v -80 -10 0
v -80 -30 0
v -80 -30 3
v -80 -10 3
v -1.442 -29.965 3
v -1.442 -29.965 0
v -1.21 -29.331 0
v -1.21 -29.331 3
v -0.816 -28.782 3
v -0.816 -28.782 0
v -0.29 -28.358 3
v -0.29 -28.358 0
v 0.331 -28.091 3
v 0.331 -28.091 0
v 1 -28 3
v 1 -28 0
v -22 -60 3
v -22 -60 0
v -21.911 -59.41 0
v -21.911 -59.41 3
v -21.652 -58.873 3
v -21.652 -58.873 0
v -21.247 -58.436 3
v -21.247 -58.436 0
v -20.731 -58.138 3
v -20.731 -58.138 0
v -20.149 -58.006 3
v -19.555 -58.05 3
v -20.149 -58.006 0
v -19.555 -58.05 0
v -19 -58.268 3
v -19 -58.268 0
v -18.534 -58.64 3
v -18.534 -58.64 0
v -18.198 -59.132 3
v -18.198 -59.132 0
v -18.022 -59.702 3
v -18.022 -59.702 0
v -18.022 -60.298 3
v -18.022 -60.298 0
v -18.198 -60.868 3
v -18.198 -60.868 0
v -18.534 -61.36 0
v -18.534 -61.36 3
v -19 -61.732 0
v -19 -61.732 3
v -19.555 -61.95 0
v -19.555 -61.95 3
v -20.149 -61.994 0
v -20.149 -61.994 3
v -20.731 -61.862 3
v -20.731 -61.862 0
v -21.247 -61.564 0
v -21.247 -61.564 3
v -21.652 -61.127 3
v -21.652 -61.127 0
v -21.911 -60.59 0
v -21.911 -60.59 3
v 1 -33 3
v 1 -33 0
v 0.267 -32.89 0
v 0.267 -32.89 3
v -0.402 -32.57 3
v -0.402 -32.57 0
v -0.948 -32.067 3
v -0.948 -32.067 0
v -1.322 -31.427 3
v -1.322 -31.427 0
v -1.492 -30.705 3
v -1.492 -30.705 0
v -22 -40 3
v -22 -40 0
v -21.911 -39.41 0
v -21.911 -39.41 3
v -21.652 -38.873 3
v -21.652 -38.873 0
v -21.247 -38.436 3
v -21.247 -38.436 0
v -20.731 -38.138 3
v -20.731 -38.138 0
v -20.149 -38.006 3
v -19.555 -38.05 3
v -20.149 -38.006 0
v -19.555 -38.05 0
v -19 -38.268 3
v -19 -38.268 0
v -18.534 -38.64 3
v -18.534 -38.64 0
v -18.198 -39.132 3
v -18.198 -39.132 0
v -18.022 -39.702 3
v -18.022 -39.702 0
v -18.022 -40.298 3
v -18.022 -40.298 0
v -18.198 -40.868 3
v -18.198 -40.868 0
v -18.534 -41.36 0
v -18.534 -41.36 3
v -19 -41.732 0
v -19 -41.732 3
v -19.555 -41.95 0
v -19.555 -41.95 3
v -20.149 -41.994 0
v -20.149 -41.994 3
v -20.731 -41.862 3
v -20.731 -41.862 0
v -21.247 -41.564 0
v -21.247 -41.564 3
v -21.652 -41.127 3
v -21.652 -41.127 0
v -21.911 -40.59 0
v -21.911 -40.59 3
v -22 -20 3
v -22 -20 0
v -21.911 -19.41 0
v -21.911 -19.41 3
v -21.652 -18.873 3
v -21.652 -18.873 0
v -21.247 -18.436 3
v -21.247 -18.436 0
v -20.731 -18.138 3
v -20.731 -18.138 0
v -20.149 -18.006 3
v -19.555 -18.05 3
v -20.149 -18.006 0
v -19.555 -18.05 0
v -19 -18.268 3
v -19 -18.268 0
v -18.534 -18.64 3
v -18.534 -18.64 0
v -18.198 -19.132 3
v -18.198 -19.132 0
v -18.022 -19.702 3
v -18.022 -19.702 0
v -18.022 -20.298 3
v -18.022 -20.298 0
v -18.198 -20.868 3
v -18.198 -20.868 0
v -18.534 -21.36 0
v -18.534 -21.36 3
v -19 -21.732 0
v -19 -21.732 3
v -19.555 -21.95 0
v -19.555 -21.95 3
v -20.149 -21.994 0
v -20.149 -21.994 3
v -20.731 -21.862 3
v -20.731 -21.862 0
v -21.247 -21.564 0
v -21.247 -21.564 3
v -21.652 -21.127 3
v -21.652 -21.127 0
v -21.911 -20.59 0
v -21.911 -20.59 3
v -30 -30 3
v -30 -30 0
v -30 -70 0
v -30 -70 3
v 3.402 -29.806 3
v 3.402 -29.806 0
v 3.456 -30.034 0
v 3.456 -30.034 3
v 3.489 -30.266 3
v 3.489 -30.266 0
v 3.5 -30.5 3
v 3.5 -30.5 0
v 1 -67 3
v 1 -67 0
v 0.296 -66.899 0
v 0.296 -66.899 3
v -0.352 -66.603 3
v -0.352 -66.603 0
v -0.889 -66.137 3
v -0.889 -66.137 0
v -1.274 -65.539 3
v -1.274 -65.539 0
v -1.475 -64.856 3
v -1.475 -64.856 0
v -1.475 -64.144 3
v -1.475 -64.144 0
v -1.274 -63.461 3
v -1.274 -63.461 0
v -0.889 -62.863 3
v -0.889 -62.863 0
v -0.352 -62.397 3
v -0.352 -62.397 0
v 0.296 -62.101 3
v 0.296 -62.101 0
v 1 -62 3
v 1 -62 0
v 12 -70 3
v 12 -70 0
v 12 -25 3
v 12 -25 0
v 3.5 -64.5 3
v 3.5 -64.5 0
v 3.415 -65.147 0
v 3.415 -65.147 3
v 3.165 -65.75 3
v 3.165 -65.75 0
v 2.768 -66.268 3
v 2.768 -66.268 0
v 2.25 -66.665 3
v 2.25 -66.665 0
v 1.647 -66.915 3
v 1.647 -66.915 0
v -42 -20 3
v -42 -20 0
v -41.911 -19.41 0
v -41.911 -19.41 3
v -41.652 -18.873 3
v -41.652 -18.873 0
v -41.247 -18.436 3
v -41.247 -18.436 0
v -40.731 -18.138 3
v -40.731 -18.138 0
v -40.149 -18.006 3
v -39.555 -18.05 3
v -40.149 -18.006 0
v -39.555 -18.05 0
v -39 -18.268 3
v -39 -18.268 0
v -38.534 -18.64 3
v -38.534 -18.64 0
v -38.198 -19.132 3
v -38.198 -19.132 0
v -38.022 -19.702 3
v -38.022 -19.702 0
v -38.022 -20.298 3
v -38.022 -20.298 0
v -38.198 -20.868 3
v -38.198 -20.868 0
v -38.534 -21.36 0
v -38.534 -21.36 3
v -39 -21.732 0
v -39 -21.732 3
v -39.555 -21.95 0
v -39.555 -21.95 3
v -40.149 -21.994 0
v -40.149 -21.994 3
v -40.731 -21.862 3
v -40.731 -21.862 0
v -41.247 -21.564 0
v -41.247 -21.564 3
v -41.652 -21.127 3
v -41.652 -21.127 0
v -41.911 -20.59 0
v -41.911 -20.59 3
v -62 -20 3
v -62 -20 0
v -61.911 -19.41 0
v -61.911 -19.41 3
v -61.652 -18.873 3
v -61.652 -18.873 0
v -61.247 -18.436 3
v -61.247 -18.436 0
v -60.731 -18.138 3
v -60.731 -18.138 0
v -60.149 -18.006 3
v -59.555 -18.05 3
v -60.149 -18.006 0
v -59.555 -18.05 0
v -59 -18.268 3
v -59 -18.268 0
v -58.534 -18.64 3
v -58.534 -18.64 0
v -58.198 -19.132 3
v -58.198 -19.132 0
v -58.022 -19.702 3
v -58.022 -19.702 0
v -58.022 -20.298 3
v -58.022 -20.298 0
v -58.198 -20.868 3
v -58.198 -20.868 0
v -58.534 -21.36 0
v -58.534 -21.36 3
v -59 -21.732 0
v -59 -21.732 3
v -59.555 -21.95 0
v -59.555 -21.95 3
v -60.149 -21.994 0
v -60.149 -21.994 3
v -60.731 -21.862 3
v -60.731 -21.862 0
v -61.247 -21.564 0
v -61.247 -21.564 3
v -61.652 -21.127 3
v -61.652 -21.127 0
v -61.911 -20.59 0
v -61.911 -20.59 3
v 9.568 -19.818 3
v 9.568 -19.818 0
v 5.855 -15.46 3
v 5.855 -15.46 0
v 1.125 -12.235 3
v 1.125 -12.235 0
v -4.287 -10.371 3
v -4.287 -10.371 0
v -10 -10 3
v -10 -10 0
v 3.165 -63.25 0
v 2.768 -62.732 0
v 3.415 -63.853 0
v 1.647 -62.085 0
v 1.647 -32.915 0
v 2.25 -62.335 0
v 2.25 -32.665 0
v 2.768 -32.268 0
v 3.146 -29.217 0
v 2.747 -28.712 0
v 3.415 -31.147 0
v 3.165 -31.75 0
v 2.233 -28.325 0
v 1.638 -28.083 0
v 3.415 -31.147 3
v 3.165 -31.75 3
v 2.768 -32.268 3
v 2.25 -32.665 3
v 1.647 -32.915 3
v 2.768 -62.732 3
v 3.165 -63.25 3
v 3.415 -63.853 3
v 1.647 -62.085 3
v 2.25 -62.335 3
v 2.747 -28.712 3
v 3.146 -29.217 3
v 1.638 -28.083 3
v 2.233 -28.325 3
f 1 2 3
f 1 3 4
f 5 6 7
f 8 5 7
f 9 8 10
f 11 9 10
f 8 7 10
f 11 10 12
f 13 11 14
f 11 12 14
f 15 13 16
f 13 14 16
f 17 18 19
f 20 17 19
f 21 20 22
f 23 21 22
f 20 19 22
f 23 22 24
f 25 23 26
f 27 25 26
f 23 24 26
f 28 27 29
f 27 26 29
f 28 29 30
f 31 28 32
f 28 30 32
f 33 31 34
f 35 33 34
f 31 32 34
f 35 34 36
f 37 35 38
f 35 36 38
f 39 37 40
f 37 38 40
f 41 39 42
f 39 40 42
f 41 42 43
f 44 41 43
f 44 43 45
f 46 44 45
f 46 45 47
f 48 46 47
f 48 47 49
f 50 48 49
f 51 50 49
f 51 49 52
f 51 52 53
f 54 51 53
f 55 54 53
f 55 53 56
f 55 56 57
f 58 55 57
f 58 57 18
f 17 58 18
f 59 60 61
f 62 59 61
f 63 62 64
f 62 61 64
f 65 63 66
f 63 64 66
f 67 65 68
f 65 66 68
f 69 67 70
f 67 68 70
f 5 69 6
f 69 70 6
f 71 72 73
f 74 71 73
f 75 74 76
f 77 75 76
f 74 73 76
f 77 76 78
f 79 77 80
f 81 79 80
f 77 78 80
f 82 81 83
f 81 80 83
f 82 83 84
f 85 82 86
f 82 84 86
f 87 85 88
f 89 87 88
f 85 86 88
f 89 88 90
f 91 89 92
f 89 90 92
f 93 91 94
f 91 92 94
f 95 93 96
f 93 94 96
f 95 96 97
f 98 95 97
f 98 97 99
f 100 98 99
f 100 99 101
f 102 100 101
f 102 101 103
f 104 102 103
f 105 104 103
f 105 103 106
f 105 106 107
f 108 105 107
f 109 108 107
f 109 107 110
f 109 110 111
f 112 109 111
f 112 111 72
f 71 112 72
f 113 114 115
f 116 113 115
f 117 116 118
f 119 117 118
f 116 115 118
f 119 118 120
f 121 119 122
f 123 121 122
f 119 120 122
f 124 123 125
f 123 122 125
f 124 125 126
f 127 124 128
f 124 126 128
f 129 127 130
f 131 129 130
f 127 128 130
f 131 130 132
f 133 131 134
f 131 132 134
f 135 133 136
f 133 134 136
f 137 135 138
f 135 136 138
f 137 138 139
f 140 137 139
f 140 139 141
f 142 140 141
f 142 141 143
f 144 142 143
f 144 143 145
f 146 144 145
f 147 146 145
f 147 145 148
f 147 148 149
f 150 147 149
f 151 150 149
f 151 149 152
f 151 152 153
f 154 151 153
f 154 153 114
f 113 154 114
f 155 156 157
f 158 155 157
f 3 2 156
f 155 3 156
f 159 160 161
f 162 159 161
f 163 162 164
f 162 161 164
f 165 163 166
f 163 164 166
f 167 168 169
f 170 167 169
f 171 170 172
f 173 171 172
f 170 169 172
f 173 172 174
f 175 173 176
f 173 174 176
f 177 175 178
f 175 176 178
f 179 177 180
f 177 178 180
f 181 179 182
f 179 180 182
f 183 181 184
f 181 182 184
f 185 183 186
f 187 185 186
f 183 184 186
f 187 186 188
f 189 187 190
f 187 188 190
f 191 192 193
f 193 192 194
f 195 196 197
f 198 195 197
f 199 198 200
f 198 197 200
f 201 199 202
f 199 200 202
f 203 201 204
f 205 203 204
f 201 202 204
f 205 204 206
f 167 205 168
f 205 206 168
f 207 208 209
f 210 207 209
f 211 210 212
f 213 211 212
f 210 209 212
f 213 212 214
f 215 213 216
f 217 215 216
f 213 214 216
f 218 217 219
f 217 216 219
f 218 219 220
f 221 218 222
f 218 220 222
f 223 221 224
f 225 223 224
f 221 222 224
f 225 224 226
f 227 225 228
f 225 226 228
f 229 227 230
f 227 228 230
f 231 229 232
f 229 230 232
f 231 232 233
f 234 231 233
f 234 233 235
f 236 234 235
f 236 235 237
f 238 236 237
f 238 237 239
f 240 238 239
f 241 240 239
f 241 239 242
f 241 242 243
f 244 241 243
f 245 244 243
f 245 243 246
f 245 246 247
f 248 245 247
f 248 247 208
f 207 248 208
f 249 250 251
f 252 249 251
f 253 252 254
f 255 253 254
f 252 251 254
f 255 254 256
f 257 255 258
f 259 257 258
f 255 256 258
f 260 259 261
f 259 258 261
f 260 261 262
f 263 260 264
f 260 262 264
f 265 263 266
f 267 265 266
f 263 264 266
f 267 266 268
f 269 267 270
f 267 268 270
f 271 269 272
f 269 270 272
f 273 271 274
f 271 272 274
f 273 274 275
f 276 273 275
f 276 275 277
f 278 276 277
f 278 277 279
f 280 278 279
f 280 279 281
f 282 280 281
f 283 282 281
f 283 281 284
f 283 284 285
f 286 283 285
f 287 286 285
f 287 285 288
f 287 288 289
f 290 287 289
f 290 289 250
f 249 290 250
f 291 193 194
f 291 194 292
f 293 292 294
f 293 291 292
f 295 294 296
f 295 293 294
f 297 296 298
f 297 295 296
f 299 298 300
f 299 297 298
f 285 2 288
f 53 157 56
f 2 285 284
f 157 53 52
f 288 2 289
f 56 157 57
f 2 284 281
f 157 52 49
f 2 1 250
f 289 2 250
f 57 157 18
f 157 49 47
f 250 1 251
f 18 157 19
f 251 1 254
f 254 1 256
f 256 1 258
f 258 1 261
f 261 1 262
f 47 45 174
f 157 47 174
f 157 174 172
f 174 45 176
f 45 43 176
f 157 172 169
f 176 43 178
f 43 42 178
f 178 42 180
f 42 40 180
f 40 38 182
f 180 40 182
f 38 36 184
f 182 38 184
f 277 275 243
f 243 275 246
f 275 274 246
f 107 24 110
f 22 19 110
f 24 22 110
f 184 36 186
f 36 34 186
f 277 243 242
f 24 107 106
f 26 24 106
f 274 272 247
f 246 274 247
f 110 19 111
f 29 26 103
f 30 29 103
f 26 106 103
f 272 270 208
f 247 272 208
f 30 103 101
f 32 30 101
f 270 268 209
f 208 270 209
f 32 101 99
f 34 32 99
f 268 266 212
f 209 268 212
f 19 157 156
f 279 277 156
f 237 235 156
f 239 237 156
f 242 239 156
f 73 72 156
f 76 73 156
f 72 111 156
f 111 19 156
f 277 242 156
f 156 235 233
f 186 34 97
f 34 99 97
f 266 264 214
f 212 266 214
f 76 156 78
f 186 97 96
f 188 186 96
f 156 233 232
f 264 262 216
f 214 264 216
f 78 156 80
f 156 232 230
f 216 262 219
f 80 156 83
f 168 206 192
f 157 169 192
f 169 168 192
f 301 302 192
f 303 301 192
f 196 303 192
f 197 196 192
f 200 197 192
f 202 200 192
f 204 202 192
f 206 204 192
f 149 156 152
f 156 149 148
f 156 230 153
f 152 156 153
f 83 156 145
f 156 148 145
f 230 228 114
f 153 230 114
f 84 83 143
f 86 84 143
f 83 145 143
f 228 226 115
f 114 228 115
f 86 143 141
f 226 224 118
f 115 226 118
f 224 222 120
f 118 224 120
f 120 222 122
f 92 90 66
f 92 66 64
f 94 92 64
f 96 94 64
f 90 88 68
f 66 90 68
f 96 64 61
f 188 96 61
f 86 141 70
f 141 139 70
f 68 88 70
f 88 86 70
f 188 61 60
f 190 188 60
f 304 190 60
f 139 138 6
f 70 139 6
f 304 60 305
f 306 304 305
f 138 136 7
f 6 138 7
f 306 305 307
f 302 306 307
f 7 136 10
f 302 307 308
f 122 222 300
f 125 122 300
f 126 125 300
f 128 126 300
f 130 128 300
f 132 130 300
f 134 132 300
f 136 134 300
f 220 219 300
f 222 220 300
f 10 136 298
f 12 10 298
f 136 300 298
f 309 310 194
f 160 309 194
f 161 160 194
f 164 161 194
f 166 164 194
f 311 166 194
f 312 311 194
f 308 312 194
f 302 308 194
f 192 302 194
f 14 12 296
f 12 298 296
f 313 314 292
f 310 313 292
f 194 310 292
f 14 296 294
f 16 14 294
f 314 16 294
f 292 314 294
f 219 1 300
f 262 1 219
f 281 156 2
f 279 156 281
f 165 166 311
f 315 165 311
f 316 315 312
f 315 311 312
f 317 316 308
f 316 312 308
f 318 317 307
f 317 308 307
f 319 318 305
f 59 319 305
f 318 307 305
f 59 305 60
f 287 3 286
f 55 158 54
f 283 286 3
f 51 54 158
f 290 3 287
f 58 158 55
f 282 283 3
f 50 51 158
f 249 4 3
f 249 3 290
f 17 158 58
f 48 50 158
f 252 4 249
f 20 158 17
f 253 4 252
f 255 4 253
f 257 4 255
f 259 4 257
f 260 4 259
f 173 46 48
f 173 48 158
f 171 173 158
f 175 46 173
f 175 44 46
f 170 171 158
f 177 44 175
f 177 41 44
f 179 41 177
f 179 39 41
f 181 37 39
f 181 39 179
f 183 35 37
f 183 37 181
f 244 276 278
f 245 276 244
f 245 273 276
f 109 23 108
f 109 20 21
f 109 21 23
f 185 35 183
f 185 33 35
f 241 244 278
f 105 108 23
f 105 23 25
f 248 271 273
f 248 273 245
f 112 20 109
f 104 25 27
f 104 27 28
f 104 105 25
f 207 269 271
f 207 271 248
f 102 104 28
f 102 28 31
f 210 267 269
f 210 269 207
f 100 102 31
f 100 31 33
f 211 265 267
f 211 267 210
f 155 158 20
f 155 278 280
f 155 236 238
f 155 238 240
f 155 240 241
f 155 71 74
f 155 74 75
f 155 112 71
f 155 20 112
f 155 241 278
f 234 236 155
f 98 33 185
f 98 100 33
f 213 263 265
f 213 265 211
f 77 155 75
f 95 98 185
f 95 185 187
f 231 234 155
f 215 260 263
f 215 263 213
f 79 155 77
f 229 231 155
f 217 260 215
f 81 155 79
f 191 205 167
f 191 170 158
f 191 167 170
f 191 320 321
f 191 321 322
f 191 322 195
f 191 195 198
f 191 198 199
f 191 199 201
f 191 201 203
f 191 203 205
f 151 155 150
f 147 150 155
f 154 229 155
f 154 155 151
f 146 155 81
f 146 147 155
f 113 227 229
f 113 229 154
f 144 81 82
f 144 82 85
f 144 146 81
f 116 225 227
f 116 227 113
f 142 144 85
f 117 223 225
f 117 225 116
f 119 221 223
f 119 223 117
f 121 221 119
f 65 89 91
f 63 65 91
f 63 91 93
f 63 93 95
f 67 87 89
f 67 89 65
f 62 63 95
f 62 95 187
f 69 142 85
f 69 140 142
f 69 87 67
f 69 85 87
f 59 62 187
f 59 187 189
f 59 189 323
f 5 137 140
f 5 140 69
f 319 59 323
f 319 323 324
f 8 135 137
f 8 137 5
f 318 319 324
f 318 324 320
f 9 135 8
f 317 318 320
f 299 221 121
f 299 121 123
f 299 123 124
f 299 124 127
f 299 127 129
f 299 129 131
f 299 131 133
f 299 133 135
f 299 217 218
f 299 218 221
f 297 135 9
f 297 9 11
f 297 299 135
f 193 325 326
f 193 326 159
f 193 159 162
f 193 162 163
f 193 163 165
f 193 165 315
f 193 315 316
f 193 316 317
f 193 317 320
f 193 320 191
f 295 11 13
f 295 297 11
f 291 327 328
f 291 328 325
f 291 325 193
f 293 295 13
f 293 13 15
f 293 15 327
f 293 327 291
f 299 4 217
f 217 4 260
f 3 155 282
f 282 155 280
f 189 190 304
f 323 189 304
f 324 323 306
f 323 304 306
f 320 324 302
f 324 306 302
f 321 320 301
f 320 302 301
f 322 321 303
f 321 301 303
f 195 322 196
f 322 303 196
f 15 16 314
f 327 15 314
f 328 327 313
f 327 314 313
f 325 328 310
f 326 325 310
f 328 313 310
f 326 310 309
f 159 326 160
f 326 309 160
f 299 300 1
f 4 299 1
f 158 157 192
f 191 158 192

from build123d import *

# Parameters (mm, degrees)
SKETCH_1_W          = 20
SKETCH_1_H          = 40
SKETCH_1_W_2        = 50
SKETCH_1_H_2        = 20
EXTRUDE_1_DEPTH     = 3
SKETCH_2_R          = 2
CUT_EXTRUDE_1_DEPTH = 10
EXTRUDE_2_DEPTH     = 3


with BuildPart() as part:
    # 草图1 → 凸台-拉伸1 (new body)
    with BuildSketch(Plane.XY):
        with Locations((-20, -50)):
            Rectangle(SKETCH_1_W, SKETCH_1_H)
        with BuildLine():
            Line((-10, -30), (-10, -70))
            Line((-10, -70), (1, -70))
            Line((1, -70), (1, -67))
            ThreePointArc((1, -67), (-1.5, -64.5), (1, -62))
            Line((1, -62), (1, -33))
            ThreePointArc((1, -33), (-0.947653554, -32.067369017), (-1.442153468, -29.965316507))
            ThreePointArc((-1.442153468, -29.965316507), (-5.782490578, -29.437438793), (-10, -28.284271247))
            Line((-10, -28.284271247), (-10, -30))
        make_face()
        with BuildLine():
            Line((1, -67), (1, -70))
            Line((1, -70), (12, -70))
            Line((12, -70), (12, -27.49545417))
            ThreePointArc((12, -27.49545417), (7.787152469, -28.971714765), (3.401885012, -29.806495573))
            ThreePointArc((3.401885012, -29.806495573), (3.475349726, -30.149794724), (3.5, -30.5))
            ThreePointArc((3.5, -30.5), (2.767766953, -32.267766953), (1, -33))
            Line((1, -33), (1, -62))
            ThreePointArc((1, -62), (2.767766953, -62.732233047), (3.5, -64.5))
            ThreePointArc((3.5, -64.5), (2.767766953, -66.267766953), (1, -67))
        make_face()
        with BuildLine():
            Line((-10, -25), (-10, -28.284271247))
            ThreePointArc((-10, -28.284271247), (-5.782490578, -29.437438793), (-1.442153468, -29.965316507))
            ThreePointArc((-1.442153468, -29.965316507), (-0.567369017, -28.552346446), (1, -28))
            Line((1, -28), (1, -25))
            Line((1, -25), (-10, -25))
        make_face()
        with BuildLine():
            ThreePointArc((3.401885012, -29.806495573), (7.787152469, -28.971714765), (12, -27.49545417))
            Line((12, -27.49545417), (12, -25))
            Line((12, -25), (1, -25))
            Line((1, -25), (1, -28))
            ThreePointArc((1, -28), (2.502704052, -28.502030898), (3.401885012, -29.806495573))
        make_face()
        with BuildLine():
            Line((-30, -10), (-30, -30))
            Line((-30, -30), (-10, -30))
            Line((-10, -30), (-10, -28.284271247))
            ThreePointArc((-10, -28.284271247), (-21.213203436, -21.213203436), (-28.284271247, -10))
            Line((-28.284271247, -10), (-30, -10))
        make_face()
        with BuildLine():
            ThreePointArc((-28.284271247, -10), (-21.213203436, -21.213203436), (-10, -28.284271247))
            Line((-10, -28.284271247), (-10, -25))
            Line((-10, -25), (-10, -10))
            Line((-10, -10), (-28.284271247, -10))
        make_face()
        with Locations((-55, -20)):
            Rectangle(SKETCH_1_W_2, SKETCH_1_H_2)
    extrude(amount=EXTRUDE_1_DEPTH)

    # 草图2 → 切除-拉伸1 (cut)
    with BuildSketch(Plane(origin=(0, 0, 0), x_dir=(-1, 0, 0), z_dir=(0, 0, -1))):
        with Locations((20, -40)):
            Circle(SKETCH_2_R)
        with Locations((40, -20)):
            Circle(SKETCH_2_R)
        with Locations((20, -20)):
            Circle(SKETCH_2_R)
        with Locations((20, -60)):
            Circle(SKETCH_2_R)
        with Locations((60, -20)):
            Circle(SKETCH_2_R)
    extrude(amount=-CUT_EXTRUDE_1_DEPTH, mode=Mode.SUBTRACT)

    # 草图3 → 凸台-拉伸2 (add)
    with BuildSketch(Plane.XY.offset(3)):
        with BuildLine():
            Line((-10, -25), (12, -25))
            ThreePointArc((12, -25), (3.597916023, -13.689723166), (-10, -10))
            Line((-10, -10), (-10, -25))
        make_face()
    extrude(amount=-EXTRUDE_2_DEPTH)


solid = part.part
